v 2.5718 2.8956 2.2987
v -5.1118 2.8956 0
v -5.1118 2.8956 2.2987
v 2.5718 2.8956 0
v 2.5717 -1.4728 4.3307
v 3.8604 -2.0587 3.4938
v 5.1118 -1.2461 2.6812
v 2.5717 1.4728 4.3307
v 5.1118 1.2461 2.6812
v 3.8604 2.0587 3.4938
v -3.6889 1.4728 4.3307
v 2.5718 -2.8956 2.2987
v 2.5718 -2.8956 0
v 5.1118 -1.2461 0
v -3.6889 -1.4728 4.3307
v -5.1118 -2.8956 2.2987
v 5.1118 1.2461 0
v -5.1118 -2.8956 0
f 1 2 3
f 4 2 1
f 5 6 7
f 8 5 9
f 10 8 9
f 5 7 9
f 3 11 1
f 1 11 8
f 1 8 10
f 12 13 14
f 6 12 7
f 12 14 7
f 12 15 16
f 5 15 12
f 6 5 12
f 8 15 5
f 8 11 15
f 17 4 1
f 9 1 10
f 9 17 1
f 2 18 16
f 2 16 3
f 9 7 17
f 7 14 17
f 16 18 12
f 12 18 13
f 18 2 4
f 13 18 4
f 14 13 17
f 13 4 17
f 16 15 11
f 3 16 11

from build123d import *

# Parameters (mm, degrees)
F0_W       = 10.2235
F0_H       = 5.7912
F1_DEPTH   = 4.3307
F2_SIZE2   = 1.4228217176
F2_SIZE    = 2.032
F3_SIZE2   = 1.6494952867
F3_SIZE    = 2.54
F3_2_SIZE2 = 1.6494952867
F3_2_SIZE  = 2.54
F3_3_SIZE2 = 1.6494952867
F3_3_SIZE  = 2.54


with BuildPart() as f1:
    # F0 (on Top) → F1 (new body)
    with BuildSketch(Plane.XY):
        Rectangle(F0_W, F0_H)
    extrude(amount=F1_DEPTH)

    # F2
    f2_edges = [f1.edges().sort_by_distance(p)[0] for p in [
        (0, -2.8956, 4.3307),
        (0, 2.8956, 4.3307),
        (-5.11175, 0, 4.3307),
    ]]
    chamfer(f2_edges, length=F2_SIZE, length2=F2_SIZE2)

    # F3
    f3_edges = [f1.edges().sort_by_distance(p)[0] for p in [
        (5.11175, 0, 4.3307),
    ]]
    f3_side = f1.faces().sort_by_distance((0.711411, 0, 4.3307))[0]
    chamfer(f3_edges, length=F3_SIZE, length2=F3_SIZE2, reference=f3_side)

    # F3#2
    f3_2_edges = [f1.edges().sort_by_distance(p)[0] for p in [
        (5.11175, -2.8956, 1.14935),
    ]]
    f3_2_side = f1.faces().sort_by_distance((0, -2.8956, 1.14935))[0]
    chamfer(f3_2_edges, length=F3_2_SIZE, length2=F3_2_SIZE2, reference=f3_2_side)

    # F3#3
    f3_3_edges = [f1.edges().sort_by_distance(p)[0] for p in [
        (5.11175, 2.8956, 1.14935),
    ]]
    f3_3_side = f1.faces().sort_by_distance((0, 2.8956, 1.14935))[0]
    chamfer(f3_3_edges, length=F3_3_SIZE, length2=F3_3_SIZE2, reference=f3_3_side)


solid = f1.part
